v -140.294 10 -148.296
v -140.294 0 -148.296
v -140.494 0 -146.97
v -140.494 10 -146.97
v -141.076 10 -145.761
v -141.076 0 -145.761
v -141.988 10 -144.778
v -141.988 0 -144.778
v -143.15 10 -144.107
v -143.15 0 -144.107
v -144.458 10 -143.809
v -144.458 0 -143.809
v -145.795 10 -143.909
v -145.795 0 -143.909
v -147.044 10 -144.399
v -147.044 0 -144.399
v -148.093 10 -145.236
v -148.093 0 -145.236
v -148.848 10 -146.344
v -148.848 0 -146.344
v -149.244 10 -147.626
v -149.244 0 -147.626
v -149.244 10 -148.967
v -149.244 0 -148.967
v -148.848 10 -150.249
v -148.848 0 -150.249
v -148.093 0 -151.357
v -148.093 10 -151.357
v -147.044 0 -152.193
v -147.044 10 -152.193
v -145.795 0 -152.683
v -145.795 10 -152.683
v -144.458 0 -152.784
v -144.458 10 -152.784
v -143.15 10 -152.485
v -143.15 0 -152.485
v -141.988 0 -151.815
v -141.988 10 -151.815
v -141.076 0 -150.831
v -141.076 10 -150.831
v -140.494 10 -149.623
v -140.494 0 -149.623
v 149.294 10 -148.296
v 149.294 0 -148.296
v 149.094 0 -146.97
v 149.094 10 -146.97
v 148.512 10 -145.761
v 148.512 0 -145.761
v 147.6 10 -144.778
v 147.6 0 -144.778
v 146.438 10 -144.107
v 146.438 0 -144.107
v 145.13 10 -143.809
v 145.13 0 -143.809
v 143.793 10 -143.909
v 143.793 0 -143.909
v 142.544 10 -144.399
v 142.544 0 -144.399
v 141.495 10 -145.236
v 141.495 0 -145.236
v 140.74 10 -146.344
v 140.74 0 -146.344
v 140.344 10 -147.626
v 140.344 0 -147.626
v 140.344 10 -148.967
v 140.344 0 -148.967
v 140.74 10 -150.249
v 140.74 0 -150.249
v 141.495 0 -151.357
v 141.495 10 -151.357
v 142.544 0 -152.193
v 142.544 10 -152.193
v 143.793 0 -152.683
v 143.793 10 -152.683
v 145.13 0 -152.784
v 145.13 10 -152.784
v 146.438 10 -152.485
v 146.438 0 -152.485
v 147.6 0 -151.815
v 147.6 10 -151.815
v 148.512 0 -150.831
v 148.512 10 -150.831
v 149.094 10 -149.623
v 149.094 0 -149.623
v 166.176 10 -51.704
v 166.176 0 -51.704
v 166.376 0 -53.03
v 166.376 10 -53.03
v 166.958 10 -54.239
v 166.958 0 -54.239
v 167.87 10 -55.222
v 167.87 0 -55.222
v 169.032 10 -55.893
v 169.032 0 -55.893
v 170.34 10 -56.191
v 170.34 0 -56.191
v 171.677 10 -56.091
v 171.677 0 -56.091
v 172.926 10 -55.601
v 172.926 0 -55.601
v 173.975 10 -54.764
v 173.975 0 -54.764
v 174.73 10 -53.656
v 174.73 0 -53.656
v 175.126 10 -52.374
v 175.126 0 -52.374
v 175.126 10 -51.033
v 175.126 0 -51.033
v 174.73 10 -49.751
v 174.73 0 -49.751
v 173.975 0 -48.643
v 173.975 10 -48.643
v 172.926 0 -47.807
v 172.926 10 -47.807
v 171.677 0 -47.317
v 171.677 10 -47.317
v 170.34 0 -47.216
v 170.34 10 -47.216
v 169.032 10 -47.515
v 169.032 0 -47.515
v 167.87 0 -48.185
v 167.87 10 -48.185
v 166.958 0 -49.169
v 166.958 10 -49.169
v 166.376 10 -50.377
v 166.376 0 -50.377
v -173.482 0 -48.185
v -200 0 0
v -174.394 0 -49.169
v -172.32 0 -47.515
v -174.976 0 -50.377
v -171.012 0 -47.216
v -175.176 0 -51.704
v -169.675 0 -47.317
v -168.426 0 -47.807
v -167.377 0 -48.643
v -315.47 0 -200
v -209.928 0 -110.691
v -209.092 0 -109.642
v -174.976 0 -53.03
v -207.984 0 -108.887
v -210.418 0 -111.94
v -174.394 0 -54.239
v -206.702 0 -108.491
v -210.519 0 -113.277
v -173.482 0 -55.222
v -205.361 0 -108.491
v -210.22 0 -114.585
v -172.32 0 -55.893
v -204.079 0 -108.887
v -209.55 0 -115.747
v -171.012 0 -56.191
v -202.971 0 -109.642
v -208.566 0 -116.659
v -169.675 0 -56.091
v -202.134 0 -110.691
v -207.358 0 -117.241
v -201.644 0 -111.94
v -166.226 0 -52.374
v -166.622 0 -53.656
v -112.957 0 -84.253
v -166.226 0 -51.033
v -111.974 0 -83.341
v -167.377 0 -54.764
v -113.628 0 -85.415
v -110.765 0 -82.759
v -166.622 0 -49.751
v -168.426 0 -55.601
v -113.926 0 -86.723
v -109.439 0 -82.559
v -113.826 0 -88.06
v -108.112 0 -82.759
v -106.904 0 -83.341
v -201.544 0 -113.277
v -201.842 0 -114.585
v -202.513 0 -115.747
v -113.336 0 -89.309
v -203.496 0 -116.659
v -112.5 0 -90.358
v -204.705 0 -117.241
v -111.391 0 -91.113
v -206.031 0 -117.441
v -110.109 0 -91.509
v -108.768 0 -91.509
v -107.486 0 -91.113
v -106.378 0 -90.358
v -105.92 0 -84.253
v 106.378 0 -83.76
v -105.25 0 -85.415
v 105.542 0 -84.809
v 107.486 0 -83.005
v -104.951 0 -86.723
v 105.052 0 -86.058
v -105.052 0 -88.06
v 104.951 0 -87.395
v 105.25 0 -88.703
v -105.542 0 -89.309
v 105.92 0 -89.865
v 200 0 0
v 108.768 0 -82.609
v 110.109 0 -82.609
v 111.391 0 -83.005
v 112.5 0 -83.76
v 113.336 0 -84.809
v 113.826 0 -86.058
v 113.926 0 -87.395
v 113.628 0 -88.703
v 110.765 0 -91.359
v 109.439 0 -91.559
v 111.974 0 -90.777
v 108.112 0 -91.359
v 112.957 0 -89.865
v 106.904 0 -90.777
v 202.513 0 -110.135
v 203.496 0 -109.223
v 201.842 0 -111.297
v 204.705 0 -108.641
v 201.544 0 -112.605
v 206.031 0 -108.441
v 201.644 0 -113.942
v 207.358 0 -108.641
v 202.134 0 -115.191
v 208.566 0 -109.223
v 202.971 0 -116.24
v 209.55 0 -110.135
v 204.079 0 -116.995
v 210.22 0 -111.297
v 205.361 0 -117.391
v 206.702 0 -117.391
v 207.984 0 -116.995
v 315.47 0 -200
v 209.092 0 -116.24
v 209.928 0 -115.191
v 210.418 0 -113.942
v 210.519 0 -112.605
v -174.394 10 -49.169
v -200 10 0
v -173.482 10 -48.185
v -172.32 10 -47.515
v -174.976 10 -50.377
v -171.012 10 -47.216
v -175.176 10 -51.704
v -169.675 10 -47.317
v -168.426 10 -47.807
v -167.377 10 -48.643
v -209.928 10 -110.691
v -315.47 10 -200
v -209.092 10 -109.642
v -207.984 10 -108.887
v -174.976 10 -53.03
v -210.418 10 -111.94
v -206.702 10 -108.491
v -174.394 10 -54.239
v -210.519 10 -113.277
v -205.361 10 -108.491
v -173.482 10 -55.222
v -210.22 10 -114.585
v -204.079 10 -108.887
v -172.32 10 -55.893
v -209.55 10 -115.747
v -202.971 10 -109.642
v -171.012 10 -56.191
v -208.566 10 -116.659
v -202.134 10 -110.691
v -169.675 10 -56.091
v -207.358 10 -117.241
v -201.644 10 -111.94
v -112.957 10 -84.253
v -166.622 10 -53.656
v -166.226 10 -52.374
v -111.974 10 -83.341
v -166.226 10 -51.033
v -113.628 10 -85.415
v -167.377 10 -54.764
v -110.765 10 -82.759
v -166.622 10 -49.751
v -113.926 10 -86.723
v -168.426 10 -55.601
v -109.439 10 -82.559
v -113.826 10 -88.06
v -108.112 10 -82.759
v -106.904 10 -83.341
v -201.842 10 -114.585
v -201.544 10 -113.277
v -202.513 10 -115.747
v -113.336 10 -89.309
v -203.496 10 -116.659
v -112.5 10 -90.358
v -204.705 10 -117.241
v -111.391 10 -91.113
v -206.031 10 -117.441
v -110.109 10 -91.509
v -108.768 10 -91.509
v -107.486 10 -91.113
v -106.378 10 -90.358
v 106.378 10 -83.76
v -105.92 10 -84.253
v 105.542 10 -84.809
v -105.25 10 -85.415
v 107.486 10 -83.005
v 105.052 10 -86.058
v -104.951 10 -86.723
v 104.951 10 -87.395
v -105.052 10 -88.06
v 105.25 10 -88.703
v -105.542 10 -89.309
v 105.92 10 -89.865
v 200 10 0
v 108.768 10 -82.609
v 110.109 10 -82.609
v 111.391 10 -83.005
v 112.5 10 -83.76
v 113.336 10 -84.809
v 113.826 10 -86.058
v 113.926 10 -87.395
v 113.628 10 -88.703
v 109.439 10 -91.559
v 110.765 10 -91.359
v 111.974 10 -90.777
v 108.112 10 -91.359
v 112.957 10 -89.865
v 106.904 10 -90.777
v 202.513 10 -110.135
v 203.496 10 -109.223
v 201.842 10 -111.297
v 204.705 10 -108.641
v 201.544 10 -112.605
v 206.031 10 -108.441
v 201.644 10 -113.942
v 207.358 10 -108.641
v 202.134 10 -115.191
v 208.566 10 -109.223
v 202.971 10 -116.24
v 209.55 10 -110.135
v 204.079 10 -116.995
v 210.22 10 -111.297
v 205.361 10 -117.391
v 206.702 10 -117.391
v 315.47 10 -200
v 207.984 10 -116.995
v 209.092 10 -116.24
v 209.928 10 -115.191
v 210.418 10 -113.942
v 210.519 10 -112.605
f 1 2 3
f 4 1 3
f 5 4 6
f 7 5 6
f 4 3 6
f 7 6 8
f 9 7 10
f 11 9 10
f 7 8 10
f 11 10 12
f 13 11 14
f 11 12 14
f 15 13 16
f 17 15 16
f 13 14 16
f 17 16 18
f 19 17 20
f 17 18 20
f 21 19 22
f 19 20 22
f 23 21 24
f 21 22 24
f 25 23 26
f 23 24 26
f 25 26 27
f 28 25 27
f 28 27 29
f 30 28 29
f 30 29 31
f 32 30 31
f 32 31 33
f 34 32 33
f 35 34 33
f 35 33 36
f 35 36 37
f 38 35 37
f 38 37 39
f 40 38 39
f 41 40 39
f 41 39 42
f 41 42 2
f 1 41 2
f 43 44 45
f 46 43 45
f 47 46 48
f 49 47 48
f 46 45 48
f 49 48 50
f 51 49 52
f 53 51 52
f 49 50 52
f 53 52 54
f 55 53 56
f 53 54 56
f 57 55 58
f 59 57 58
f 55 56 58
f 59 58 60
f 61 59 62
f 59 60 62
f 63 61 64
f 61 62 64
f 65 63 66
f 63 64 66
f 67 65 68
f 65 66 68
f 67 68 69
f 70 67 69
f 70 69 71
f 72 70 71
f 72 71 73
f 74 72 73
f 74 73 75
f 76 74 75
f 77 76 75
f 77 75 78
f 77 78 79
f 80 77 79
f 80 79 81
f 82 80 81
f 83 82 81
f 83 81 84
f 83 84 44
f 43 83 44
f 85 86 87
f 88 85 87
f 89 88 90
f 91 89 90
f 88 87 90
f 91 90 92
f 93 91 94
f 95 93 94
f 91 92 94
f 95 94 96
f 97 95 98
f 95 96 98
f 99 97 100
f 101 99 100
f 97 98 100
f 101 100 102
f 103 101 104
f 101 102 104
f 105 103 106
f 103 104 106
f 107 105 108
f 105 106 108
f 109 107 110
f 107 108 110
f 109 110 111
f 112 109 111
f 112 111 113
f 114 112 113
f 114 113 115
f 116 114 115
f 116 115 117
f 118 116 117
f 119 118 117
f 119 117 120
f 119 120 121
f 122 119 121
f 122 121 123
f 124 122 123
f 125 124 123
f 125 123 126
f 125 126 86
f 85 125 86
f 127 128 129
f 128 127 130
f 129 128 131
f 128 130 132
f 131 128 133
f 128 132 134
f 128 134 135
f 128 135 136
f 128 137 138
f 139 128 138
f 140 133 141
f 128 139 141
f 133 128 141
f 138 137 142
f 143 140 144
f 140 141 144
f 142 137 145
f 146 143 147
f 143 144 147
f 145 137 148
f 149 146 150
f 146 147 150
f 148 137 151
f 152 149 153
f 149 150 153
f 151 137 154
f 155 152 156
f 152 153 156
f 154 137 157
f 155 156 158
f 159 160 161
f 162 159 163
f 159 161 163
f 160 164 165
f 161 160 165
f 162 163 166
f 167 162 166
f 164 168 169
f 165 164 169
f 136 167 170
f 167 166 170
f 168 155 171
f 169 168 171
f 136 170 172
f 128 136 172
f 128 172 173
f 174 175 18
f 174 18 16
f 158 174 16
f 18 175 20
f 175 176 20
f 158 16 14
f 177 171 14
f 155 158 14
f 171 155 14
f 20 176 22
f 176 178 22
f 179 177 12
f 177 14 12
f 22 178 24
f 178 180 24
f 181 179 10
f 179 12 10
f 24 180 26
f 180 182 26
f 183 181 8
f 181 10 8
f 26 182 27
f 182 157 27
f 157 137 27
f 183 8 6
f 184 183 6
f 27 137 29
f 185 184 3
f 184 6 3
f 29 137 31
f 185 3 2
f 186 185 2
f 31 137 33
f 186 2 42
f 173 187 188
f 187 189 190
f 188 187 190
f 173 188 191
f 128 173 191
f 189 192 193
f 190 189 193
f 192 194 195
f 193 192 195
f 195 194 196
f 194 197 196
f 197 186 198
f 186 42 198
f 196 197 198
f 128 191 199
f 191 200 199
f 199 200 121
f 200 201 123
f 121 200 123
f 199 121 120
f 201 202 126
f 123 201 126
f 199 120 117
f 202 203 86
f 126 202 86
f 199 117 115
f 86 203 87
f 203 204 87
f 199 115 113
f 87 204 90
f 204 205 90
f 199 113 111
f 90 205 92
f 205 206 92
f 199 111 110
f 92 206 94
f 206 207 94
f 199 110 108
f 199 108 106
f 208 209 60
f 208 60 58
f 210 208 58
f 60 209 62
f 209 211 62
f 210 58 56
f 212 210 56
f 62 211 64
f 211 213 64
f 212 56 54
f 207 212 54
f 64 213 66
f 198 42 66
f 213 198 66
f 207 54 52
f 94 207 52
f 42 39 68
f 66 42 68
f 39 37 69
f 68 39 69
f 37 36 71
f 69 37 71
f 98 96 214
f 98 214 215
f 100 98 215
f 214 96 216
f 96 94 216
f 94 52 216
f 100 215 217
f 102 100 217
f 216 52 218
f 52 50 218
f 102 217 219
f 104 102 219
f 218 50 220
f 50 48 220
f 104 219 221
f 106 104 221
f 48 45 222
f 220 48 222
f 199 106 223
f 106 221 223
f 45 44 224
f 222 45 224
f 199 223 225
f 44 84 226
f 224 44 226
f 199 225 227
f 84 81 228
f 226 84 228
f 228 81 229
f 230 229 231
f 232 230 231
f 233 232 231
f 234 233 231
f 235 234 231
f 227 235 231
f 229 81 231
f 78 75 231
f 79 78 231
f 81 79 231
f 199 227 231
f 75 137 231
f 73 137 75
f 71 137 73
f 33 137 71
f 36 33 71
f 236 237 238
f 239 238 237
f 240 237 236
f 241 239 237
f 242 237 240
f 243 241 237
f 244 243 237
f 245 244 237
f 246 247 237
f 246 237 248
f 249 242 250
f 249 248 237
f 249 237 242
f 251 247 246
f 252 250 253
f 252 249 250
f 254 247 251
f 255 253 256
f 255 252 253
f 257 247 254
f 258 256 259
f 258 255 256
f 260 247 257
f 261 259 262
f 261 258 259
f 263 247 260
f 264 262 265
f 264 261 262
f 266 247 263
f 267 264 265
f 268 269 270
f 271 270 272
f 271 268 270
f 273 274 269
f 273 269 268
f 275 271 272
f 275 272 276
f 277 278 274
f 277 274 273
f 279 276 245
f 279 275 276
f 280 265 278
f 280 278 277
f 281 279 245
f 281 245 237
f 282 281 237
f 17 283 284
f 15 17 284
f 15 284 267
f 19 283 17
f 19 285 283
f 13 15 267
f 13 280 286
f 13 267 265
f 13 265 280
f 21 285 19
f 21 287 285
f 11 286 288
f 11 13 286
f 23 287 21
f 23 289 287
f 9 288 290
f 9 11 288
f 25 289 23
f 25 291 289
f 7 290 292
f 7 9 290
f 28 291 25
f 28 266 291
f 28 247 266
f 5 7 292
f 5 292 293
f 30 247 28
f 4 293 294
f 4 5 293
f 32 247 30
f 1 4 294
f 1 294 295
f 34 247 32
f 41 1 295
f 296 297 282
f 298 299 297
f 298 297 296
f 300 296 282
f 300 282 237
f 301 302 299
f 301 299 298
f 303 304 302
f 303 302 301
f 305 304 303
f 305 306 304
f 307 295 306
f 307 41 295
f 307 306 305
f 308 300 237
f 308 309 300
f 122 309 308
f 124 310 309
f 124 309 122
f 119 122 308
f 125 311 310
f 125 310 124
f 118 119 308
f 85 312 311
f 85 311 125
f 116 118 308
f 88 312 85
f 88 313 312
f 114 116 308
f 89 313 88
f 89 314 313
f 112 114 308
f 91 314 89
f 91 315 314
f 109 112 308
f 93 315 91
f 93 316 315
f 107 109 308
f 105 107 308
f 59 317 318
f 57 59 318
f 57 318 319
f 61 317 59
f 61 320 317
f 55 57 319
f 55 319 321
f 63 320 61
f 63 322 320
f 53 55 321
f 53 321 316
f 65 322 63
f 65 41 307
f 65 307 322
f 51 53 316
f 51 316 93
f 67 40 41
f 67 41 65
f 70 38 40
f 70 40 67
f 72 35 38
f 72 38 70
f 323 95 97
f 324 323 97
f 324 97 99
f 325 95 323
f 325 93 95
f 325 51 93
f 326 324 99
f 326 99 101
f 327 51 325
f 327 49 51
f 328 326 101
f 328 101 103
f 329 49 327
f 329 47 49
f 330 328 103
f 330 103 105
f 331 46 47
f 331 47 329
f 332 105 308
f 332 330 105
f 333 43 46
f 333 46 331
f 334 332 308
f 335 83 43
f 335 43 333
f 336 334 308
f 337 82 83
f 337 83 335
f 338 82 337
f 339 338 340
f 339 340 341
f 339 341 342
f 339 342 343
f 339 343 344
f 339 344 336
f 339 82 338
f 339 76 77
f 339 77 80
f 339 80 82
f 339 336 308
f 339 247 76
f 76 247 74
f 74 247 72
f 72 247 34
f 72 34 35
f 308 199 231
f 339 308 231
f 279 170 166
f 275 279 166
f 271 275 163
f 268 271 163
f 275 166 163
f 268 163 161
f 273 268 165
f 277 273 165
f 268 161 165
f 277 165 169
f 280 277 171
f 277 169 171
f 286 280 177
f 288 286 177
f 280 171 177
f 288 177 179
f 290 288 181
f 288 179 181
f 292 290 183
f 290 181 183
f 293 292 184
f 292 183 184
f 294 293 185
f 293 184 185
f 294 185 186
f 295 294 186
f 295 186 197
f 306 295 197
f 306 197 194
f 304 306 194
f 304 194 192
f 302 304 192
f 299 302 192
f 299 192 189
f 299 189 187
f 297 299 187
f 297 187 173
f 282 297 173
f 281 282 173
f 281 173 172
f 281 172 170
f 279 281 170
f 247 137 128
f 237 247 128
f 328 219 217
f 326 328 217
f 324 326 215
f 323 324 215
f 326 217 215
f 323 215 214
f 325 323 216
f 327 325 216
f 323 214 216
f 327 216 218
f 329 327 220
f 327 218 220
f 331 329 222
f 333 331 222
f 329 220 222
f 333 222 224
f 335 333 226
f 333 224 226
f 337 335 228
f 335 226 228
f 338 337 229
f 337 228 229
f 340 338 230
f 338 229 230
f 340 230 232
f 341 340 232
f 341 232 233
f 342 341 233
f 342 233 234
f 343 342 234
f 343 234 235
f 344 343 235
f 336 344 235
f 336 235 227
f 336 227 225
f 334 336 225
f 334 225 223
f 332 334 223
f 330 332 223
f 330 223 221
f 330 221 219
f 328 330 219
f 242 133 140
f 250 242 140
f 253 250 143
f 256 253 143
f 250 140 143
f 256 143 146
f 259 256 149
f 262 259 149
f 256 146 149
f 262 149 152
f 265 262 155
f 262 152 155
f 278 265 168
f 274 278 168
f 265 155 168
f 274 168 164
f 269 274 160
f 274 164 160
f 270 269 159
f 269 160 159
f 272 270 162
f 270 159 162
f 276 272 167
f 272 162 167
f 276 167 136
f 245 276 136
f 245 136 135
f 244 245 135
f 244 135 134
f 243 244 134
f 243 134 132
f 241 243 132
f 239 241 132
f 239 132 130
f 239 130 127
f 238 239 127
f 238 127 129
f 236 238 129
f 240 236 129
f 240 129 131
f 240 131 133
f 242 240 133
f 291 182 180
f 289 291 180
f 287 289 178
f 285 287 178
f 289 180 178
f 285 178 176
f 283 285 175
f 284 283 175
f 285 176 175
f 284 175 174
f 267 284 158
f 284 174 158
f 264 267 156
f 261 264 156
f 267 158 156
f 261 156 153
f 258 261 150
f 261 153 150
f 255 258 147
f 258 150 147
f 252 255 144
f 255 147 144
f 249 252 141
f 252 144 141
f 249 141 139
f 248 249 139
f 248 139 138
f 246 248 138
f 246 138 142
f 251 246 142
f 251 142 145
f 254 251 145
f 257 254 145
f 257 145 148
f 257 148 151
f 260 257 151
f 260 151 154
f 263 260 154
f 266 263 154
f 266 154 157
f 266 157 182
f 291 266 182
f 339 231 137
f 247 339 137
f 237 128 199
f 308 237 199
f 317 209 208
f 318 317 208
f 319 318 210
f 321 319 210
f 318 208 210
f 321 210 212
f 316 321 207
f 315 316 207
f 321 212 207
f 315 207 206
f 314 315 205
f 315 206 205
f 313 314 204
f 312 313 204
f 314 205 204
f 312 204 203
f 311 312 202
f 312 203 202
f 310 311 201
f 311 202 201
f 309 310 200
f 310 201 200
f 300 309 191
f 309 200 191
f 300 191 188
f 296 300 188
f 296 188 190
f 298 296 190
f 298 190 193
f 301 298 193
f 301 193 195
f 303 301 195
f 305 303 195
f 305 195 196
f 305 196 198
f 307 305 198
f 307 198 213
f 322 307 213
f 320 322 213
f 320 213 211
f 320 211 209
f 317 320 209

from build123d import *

# Parameters (mm, degrees)
BOSS_EXTRUDE1_DEPTH  = 10
M8_CLEARANCE_HOLE4_D = 9
M8_CLEARANCE_HOLE5_D = 9
CIRPATTERN1_COUNT    = 4
CIRPATTERN2_COUNT    = 4


with BuildPart() as part:
    # Sketch1 → Boss-Extrude1 (new body)
    with BuildSketch(Plane(origin=(0, 0, 0), x_dir=(1, 0, 0), z_dir=(0, 1, 0))):
        Polygon((-200, 0), (200, 0), (315.470053838, 200), (-315.470053838, 200), align=None)
    extrude(amount=BOSS_EXTRUDE1_DEPTH)

    # M8 Clearance Hole4 (through all)
    with Locations(Plane(origin=(0, 10, 0), x_dir=(1, 0, 0), z_dir=(0, 1, 0))):
        with Locations((-170.675979174, 51.703708686)):
            m8_clearance_hole4 = Hole(M8_CLEARANCE_HOLE4_D / 2)

    # M8 Clearance Hole5 (through all)
    with Locations(Plane(origin=(0, 10, 0), x_dir=(1, 0, 0), z_dir=(0, 1, 0))):
        with Locations((170.675979174, 51.703708686)):
            m8_clearance_hole5 = Hole(M8_CLEARANCE_HOLE5_D / 2)

    # CirPattern1: M8 Clearance Hole5 ×4 about axis
    cirpattern1_axis = Axis((157.735026919, 10, -100), (0, 1, 0))
    for i in range(1, CIRPATTERN1_COUNT):
        add(m8_clearance_hole5.rotate(cirpattern1_axis, i * 360 / CIRPATTERN1_COUNT), mode=Mode.SUBTRACT)

    # CirPattern2: M8 Clearance Hole4 ×4 about axis
    cirpattern2_axis = Axis((-157.735026919, 10, -100), (0, 1, 0))
    for i in range(1, CIRPATTERN2_COUNT):
        add(m8_clearance_hole4.rotate(cirpattern2_axis, i * 360 / CIRPATTERN2_COUNT), mode=Mode.SUBTRACT)


solid = part.part
